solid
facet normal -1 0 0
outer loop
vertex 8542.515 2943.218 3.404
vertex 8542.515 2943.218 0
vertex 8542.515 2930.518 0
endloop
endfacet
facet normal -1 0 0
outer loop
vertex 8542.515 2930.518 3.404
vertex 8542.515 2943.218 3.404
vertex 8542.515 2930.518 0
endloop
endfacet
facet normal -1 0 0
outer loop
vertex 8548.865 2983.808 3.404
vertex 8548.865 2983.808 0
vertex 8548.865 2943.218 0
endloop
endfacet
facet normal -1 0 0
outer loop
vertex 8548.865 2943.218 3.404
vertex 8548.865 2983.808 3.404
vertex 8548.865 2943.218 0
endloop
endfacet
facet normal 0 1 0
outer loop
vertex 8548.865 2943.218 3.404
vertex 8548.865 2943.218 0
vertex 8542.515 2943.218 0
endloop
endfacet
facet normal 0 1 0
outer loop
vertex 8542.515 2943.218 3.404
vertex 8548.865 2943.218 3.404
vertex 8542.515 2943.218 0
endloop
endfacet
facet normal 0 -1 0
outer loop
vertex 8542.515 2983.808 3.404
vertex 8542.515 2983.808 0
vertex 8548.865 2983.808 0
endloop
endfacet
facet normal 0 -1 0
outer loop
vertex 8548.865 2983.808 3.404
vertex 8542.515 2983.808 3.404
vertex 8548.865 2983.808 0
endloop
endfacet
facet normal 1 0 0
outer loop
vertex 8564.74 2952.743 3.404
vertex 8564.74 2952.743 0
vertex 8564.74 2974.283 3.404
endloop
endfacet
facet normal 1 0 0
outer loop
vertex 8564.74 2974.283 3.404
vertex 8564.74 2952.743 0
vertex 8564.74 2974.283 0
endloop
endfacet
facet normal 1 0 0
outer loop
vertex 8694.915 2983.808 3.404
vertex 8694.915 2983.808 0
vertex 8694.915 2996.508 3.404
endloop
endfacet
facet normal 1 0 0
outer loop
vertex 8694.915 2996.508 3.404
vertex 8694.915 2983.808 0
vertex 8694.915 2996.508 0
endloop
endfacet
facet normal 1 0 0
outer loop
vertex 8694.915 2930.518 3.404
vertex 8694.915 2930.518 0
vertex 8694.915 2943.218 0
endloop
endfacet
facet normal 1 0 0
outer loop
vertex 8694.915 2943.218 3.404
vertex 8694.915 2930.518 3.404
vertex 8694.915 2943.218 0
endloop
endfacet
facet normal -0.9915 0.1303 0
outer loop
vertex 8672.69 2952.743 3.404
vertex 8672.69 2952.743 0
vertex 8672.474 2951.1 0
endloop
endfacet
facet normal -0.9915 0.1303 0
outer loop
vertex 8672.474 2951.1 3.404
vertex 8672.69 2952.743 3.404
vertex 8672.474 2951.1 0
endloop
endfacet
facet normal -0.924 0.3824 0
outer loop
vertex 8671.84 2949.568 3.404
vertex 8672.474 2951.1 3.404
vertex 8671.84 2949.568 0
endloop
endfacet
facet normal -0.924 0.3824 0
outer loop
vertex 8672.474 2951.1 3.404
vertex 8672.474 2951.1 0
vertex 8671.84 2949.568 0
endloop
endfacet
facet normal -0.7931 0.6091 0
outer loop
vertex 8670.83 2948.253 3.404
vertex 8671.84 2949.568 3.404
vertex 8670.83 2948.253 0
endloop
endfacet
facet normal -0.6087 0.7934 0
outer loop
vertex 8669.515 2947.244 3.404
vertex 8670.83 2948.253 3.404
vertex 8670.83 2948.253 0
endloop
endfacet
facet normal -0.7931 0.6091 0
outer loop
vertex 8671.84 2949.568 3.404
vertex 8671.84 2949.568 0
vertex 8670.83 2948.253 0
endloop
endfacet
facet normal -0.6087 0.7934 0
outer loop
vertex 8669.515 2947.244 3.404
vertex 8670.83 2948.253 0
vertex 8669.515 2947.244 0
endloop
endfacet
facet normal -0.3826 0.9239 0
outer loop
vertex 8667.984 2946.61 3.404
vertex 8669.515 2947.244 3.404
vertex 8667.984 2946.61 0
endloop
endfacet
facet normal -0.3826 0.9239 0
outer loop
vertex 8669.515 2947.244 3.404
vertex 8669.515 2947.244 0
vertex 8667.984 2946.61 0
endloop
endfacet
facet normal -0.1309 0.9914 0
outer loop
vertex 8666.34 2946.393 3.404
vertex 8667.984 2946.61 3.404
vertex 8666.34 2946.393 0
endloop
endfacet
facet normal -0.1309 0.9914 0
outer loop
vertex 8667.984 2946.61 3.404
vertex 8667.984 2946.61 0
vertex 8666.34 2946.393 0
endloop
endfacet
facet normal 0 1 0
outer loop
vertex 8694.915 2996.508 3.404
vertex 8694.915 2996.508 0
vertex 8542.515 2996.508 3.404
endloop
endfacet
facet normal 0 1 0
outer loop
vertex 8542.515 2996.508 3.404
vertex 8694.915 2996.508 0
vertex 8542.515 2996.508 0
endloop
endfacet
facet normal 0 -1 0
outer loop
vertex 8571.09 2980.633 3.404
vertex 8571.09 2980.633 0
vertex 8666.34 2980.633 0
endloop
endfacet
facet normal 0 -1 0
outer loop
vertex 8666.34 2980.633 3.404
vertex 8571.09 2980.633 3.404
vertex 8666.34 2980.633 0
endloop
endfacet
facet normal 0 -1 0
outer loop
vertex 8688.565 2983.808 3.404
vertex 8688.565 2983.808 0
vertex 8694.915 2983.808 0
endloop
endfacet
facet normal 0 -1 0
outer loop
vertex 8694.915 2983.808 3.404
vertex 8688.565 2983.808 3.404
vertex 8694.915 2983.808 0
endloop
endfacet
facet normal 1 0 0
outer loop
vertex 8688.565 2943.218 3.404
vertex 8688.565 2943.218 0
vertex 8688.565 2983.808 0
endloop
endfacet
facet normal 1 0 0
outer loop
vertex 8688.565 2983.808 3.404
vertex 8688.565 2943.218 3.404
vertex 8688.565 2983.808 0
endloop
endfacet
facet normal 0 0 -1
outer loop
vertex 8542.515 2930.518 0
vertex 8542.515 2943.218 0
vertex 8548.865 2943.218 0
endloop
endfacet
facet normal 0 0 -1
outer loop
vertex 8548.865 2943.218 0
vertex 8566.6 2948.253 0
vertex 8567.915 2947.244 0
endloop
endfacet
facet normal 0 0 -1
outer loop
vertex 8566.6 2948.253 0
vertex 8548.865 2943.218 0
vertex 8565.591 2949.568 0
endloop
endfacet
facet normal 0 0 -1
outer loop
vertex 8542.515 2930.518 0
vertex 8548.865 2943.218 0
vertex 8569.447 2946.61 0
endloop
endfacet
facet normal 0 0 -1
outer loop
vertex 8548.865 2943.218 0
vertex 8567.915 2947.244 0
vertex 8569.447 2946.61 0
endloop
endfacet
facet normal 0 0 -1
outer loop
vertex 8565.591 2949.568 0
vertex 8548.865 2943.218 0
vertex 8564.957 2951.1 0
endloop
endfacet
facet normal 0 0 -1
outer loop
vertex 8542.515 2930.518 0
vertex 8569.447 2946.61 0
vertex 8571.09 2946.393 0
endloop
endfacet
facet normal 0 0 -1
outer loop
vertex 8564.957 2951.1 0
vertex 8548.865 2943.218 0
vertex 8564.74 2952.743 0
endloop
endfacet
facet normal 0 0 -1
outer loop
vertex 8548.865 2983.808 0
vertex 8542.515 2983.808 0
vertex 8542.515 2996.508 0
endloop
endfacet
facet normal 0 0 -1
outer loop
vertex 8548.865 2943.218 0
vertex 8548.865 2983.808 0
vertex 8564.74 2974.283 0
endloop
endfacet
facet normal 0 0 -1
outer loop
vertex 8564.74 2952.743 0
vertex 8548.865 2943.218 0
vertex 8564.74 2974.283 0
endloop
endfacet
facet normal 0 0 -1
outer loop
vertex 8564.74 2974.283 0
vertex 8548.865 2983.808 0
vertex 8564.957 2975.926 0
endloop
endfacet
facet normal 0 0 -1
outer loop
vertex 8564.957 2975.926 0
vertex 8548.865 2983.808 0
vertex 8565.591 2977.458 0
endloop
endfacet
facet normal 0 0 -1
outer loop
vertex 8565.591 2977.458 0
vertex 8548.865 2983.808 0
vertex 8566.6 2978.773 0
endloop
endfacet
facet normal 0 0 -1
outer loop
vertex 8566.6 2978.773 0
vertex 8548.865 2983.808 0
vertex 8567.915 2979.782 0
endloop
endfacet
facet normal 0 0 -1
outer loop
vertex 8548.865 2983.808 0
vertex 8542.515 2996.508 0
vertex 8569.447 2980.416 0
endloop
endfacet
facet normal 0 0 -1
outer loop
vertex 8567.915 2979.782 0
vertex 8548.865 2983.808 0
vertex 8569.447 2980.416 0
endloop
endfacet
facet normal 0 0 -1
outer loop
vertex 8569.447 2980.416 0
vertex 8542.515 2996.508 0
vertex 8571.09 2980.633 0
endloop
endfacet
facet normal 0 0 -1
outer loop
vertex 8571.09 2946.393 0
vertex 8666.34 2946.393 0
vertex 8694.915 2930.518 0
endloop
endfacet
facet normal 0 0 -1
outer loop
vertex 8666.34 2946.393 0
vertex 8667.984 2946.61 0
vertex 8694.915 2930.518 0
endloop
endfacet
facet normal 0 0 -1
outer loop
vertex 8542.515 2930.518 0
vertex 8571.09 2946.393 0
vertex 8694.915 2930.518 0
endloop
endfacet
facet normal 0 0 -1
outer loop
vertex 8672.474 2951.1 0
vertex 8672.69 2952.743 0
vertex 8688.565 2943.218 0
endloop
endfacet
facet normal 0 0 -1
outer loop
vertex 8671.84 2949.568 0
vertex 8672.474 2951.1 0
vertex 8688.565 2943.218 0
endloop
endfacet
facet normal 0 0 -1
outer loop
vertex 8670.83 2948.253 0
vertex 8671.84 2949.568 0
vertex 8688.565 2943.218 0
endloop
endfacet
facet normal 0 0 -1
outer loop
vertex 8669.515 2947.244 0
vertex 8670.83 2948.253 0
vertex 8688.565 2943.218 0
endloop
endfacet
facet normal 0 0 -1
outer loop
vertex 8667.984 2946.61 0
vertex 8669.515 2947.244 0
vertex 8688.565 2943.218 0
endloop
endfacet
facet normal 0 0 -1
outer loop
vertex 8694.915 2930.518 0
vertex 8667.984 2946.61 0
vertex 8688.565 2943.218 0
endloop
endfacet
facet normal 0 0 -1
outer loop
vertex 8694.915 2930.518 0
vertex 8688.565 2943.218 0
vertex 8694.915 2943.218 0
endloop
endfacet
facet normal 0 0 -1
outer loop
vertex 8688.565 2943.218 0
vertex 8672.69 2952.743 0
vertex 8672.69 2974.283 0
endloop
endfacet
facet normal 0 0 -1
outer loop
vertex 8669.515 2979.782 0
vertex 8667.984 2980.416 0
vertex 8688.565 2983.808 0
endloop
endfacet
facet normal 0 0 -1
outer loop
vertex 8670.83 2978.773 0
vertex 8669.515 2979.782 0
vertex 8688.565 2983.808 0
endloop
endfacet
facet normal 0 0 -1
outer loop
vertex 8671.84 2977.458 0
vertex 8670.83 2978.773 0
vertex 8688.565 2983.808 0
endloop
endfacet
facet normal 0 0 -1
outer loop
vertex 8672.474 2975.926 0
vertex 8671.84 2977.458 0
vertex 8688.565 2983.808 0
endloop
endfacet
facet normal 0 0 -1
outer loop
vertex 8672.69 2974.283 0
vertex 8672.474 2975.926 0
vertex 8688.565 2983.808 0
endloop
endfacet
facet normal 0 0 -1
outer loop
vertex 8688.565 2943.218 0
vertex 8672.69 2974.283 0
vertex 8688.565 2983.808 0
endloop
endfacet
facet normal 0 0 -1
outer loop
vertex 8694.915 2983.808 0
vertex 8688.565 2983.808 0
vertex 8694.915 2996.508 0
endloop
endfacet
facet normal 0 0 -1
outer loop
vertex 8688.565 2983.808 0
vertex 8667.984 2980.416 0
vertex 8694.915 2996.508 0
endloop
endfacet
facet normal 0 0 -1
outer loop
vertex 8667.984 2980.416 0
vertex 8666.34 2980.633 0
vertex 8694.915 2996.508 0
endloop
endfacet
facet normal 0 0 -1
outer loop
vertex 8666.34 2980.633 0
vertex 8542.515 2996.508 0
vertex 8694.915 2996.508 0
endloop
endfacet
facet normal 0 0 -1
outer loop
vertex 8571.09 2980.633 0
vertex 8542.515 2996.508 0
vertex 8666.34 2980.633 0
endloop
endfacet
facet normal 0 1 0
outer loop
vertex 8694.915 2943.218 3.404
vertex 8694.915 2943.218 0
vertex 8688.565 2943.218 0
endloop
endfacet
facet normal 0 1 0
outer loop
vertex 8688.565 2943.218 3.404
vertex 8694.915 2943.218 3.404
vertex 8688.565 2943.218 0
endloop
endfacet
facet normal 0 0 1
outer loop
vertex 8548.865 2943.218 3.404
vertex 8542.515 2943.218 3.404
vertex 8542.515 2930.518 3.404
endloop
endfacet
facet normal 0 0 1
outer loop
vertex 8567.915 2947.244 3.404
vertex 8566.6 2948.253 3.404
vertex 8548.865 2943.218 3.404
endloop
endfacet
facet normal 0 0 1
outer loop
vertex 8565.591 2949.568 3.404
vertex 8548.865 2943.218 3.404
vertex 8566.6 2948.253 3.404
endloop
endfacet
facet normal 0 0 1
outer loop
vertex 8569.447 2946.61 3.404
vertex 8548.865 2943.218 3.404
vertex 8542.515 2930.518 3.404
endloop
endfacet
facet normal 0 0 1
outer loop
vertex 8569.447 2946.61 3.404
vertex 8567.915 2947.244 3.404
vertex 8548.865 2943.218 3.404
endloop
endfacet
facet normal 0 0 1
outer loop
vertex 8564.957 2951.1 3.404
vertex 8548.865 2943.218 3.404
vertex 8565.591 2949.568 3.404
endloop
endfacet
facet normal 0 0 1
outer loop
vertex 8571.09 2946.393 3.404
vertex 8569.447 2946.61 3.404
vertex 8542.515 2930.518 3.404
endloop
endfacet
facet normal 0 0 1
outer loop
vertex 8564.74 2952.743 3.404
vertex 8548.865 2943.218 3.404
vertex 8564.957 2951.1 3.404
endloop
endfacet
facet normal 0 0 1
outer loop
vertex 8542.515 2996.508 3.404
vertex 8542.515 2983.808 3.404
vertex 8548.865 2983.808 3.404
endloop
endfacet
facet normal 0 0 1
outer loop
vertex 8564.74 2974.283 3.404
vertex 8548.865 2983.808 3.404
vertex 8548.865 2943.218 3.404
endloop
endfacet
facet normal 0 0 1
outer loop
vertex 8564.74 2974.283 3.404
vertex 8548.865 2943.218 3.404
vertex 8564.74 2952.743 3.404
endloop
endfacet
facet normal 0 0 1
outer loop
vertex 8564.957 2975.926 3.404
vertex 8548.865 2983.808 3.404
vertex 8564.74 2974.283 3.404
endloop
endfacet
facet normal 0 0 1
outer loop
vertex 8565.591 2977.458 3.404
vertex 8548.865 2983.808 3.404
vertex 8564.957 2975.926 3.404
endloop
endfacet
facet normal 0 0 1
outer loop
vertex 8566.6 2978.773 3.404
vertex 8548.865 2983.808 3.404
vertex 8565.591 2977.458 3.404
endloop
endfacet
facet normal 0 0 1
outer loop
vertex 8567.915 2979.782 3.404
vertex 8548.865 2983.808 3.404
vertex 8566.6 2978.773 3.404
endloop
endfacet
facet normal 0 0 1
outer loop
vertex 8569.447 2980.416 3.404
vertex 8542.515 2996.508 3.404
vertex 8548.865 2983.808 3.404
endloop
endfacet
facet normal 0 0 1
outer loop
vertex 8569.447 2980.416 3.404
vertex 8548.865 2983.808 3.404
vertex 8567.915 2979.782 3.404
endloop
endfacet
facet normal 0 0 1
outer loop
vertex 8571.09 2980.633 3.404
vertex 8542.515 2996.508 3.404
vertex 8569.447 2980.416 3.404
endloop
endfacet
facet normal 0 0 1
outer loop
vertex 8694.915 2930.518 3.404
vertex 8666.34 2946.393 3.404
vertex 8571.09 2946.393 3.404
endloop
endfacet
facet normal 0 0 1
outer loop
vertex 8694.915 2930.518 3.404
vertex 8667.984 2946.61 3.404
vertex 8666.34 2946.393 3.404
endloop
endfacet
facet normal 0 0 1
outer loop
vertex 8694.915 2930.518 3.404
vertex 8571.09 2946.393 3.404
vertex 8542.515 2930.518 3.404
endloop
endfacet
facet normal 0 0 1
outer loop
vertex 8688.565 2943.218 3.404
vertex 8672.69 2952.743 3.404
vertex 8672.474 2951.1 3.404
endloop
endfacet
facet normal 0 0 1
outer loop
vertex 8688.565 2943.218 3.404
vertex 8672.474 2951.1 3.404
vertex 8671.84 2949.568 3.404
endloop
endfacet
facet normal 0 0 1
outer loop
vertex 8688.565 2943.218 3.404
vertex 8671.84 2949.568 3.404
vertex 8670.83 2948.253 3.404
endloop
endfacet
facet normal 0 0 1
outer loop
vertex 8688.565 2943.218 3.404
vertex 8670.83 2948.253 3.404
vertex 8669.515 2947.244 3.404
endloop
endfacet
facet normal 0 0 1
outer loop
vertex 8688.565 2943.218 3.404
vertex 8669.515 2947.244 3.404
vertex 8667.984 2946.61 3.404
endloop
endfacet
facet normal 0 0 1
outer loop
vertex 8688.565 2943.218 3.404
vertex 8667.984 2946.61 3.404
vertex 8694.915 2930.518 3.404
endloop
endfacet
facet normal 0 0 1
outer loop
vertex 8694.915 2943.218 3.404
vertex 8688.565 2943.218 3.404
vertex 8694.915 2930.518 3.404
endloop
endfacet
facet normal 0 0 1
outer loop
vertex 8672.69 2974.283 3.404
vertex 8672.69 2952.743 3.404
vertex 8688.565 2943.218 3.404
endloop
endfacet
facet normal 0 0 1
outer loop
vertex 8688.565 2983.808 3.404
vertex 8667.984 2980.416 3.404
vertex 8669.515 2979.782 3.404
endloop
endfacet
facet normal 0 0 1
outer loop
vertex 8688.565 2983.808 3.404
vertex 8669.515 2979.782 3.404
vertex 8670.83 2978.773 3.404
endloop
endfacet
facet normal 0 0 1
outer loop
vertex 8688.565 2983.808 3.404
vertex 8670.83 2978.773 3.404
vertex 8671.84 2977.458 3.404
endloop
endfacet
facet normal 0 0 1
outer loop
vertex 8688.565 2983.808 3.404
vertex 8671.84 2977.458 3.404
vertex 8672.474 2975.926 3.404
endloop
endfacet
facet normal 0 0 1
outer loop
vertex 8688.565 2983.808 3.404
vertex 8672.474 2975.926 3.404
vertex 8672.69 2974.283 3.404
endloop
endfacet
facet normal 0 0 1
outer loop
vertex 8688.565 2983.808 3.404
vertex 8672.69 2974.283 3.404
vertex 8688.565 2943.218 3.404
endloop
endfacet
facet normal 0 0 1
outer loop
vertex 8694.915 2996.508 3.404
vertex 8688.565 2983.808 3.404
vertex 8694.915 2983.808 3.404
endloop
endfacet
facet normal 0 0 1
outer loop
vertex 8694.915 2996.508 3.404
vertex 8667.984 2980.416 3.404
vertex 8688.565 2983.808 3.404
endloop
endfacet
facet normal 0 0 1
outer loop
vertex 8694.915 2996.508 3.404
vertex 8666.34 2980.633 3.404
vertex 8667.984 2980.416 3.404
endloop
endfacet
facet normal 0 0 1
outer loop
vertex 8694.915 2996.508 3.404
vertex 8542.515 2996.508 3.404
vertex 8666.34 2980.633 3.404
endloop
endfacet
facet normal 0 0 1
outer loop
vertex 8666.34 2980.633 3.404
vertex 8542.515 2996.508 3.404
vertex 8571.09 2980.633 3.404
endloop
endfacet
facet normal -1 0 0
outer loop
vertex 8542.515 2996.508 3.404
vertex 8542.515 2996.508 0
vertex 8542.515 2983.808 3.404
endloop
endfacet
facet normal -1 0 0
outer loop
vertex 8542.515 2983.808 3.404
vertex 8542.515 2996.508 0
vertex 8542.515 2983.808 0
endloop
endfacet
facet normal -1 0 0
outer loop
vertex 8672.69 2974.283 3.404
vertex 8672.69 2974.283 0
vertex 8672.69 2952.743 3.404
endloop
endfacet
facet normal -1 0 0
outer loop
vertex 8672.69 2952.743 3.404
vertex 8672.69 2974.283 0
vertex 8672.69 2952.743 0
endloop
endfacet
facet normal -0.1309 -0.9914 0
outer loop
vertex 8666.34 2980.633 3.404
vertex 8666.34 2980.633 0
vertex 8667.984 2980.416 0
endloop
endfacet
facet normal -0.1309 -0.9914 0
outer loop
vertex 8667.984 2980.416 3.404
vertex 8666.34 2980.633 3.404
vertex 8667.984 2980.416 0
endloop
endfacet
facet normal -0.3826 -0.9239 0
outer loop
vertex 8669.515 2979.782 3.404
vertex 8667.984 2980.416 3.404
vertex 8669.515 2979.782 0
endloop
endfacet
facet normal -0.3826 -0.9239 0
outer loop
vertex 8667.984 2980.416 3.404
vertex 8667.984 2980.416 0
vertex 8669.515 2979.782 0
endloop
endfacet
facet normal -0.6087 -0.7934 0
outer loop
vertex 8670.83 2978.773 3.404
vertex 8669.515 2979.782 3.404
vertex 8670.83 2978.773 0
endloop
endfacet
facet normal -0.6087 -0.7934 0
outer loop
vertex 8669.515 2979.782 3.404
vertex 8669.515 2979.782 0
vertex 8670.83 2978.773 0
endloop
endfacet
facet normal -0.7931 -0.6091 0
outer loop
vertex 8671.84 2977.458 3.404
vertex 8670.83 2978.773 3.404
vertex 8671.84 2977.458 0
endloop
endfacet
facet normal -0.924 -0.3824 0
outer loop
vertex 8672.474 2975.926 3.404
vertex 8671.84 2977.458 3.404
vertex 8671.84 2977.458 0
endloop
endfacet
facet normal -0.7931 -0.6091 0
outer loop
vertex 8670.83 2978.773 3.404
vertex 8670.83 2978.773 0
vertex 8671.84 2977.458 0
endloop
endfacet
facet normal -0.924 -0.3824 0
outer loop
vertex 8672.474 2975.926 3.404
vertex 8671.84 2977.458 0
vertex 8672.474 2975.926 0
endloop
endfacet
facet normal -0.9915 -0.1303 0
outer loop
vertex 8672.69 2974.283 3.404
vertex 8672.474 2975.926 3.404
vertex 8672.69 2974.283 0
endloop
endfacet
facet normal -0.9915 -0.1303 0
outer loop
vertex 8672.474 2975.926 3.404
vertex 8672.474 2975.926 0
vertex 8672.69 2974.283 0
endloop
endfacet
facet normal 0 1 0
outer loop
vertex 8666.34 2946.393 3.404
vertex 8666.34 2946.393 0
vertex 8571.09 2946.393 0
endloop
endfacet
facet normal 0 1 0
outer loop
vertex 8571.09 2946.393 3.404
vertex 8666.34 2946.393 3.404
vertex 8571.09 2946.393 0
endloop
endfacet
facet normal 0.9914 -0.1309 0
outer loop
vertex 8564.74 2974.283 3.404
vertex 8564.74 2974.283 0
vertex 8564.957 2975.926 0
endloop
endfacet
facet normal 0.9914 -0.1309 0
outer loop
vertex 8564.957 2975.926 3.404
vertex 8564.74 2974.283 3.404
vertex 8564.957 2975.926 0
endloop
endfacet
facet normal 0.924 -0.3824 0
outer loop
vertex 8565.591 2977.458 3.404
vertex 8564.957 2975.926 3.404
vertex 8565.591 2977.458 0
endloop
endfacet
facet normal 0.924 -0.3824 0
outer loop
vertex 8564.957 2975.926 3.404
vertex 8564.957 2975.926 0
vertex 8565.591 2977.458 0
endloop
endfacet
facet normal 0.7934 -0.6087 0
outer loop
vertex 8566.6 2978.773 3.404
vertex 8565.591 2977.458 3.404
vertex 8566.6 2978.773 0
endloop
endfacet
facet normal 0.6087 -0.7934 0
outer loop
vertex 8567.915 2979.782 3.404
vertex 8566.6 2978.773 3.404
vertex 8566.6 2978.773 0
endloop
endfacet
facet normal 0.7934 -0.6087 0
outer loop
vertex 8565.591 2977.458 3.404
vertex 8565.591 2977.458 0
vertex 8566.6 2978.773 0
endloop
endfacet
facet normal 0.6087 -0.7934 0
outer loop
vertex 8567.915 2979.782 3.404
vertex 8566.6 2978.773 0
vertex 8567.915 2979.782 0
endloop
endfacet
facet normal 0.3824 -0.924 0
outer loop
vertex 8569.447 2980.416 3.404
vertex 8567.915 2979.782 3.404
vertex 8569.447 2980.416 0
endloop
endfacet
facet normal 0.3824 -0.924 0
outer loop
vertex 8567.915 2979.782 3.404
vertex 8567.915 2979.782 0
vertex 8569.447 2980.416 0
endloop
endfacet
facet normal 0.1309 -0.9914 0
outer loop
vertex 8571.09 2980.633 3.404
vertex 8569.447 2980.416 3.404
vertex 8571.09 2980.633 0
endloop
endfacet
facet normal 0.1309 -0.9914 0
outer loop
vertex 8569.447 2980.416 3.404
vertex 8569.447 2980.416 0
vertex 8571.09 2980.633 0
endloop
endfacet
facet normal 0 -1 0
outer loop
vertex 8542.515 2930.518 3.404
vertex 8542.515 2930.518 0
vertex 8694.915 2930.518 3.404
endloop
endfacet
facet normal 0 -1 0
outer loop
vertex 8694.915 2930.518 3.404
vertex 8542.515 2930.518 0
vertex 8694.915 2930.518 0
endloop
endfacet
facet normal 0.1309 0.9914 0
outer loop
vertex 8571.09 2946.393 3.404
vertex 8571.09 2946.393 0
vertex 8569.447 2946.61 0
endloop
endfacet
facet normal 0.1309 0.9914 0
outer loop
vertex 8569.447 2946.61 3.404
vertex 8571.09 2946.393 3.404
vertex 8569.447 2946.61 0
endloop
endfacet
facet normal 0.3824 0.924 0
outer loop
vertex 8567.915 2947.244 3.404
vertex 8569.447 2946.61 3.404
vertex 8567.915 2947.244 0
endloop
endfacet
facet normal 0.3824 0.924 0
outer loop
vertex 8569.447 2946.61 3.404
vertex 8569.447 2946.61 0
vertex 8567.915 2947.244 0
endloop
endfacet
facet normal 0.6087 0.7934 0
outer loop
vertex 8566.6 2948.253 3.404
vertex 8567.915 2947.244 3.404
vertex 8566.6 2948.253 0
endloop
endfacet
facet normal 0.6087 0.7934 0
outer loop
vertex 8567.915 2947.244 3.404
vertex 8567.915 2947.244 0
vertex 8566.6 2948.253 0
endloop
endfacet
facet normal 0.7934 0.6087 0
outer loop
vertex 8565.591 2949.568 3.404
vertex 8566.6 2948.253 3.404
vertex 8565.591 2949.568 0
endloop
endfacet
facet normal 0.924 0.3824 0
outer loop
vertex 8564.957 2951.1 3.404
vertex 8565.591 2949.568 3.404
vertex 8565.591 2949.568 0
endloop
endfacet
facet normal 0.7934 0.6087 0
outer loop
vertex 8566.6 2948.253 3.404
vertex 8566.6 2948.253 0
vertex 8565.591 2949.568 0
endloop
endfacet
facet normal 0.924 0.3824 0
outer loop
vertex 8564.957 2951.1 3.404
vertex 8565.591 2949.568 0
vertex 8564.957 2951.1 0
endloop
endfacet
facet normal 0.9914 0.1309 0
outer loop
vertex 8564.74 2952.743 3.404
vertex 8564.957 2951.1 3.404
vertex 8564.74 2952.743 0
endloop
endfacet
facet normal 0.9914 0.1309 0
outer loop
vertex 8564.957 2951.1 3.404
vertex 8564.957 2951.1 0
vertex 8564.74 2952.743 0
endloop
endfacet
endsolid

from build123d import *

# Parameters (mm, degrees)
BOSS_EXTRUDE1_DEPTH = 3.4036


with BuildPart() as part:
    # Sketch1 → Boss-Extrude1 (new body)
    with BuildSketch(Plane.XY):
        Polygon((8548.865297466, 2983.807539807), (8548.865297466, 2943.218339807), (8542.515297466, 2943.218339807), (8542.515297466, 2930.518339807), (8694.915297466, 2930.518339807), (8694.915297466, 2943.218339807), (8688.565297466, 2943.218339807), (8688.565297466, 2983.807539807), (8694.915297466, 2983.807539807), (8694.915297466, 2996.507539807), (8542.515297466, 2996.507539807), (8542.515297466, 2983.807539807), align=None)
        with BuildLine():
            ThreePointArc((8571.090297466, 2946.393339807), (8566.600169406, 2948.253211746), (8564.740297466, 2952.743339807))
            Line((8564.740297466, 2952.743339807), (8564.740297466, 2974.282539807))
            ThreePointArc((8564.740297466, 2974.282539807), (8566.600169406, 2978.772667867), (8571.090297466, 2980.632539807))
            Line((8571.090297466, 2980.632539807), (8666.340297466, 2980.632539807))
            ThreePointArc((8666.340297466, 2980.632539807), (8670.830425527, 2978.772667867), (8672.690297466, 2974.282539807))
            Line((8672.690297466, 2974.282539807), (8672.690297466, 2952.743339807))
            ThreePointArc((8672.690297466, 2952.743339807), (8670.830425527, 2948.253211746), (8666.340297466, 2946.393339807))
            Line((8666.340297466, 2946.393339807), (8571.090297466, 2946.393339807))
        make_face(mode=Mode.SUBTRACT)
    extrude(amount=BOSS_EXTRUDE1_DEPTH)


solid = part.part
